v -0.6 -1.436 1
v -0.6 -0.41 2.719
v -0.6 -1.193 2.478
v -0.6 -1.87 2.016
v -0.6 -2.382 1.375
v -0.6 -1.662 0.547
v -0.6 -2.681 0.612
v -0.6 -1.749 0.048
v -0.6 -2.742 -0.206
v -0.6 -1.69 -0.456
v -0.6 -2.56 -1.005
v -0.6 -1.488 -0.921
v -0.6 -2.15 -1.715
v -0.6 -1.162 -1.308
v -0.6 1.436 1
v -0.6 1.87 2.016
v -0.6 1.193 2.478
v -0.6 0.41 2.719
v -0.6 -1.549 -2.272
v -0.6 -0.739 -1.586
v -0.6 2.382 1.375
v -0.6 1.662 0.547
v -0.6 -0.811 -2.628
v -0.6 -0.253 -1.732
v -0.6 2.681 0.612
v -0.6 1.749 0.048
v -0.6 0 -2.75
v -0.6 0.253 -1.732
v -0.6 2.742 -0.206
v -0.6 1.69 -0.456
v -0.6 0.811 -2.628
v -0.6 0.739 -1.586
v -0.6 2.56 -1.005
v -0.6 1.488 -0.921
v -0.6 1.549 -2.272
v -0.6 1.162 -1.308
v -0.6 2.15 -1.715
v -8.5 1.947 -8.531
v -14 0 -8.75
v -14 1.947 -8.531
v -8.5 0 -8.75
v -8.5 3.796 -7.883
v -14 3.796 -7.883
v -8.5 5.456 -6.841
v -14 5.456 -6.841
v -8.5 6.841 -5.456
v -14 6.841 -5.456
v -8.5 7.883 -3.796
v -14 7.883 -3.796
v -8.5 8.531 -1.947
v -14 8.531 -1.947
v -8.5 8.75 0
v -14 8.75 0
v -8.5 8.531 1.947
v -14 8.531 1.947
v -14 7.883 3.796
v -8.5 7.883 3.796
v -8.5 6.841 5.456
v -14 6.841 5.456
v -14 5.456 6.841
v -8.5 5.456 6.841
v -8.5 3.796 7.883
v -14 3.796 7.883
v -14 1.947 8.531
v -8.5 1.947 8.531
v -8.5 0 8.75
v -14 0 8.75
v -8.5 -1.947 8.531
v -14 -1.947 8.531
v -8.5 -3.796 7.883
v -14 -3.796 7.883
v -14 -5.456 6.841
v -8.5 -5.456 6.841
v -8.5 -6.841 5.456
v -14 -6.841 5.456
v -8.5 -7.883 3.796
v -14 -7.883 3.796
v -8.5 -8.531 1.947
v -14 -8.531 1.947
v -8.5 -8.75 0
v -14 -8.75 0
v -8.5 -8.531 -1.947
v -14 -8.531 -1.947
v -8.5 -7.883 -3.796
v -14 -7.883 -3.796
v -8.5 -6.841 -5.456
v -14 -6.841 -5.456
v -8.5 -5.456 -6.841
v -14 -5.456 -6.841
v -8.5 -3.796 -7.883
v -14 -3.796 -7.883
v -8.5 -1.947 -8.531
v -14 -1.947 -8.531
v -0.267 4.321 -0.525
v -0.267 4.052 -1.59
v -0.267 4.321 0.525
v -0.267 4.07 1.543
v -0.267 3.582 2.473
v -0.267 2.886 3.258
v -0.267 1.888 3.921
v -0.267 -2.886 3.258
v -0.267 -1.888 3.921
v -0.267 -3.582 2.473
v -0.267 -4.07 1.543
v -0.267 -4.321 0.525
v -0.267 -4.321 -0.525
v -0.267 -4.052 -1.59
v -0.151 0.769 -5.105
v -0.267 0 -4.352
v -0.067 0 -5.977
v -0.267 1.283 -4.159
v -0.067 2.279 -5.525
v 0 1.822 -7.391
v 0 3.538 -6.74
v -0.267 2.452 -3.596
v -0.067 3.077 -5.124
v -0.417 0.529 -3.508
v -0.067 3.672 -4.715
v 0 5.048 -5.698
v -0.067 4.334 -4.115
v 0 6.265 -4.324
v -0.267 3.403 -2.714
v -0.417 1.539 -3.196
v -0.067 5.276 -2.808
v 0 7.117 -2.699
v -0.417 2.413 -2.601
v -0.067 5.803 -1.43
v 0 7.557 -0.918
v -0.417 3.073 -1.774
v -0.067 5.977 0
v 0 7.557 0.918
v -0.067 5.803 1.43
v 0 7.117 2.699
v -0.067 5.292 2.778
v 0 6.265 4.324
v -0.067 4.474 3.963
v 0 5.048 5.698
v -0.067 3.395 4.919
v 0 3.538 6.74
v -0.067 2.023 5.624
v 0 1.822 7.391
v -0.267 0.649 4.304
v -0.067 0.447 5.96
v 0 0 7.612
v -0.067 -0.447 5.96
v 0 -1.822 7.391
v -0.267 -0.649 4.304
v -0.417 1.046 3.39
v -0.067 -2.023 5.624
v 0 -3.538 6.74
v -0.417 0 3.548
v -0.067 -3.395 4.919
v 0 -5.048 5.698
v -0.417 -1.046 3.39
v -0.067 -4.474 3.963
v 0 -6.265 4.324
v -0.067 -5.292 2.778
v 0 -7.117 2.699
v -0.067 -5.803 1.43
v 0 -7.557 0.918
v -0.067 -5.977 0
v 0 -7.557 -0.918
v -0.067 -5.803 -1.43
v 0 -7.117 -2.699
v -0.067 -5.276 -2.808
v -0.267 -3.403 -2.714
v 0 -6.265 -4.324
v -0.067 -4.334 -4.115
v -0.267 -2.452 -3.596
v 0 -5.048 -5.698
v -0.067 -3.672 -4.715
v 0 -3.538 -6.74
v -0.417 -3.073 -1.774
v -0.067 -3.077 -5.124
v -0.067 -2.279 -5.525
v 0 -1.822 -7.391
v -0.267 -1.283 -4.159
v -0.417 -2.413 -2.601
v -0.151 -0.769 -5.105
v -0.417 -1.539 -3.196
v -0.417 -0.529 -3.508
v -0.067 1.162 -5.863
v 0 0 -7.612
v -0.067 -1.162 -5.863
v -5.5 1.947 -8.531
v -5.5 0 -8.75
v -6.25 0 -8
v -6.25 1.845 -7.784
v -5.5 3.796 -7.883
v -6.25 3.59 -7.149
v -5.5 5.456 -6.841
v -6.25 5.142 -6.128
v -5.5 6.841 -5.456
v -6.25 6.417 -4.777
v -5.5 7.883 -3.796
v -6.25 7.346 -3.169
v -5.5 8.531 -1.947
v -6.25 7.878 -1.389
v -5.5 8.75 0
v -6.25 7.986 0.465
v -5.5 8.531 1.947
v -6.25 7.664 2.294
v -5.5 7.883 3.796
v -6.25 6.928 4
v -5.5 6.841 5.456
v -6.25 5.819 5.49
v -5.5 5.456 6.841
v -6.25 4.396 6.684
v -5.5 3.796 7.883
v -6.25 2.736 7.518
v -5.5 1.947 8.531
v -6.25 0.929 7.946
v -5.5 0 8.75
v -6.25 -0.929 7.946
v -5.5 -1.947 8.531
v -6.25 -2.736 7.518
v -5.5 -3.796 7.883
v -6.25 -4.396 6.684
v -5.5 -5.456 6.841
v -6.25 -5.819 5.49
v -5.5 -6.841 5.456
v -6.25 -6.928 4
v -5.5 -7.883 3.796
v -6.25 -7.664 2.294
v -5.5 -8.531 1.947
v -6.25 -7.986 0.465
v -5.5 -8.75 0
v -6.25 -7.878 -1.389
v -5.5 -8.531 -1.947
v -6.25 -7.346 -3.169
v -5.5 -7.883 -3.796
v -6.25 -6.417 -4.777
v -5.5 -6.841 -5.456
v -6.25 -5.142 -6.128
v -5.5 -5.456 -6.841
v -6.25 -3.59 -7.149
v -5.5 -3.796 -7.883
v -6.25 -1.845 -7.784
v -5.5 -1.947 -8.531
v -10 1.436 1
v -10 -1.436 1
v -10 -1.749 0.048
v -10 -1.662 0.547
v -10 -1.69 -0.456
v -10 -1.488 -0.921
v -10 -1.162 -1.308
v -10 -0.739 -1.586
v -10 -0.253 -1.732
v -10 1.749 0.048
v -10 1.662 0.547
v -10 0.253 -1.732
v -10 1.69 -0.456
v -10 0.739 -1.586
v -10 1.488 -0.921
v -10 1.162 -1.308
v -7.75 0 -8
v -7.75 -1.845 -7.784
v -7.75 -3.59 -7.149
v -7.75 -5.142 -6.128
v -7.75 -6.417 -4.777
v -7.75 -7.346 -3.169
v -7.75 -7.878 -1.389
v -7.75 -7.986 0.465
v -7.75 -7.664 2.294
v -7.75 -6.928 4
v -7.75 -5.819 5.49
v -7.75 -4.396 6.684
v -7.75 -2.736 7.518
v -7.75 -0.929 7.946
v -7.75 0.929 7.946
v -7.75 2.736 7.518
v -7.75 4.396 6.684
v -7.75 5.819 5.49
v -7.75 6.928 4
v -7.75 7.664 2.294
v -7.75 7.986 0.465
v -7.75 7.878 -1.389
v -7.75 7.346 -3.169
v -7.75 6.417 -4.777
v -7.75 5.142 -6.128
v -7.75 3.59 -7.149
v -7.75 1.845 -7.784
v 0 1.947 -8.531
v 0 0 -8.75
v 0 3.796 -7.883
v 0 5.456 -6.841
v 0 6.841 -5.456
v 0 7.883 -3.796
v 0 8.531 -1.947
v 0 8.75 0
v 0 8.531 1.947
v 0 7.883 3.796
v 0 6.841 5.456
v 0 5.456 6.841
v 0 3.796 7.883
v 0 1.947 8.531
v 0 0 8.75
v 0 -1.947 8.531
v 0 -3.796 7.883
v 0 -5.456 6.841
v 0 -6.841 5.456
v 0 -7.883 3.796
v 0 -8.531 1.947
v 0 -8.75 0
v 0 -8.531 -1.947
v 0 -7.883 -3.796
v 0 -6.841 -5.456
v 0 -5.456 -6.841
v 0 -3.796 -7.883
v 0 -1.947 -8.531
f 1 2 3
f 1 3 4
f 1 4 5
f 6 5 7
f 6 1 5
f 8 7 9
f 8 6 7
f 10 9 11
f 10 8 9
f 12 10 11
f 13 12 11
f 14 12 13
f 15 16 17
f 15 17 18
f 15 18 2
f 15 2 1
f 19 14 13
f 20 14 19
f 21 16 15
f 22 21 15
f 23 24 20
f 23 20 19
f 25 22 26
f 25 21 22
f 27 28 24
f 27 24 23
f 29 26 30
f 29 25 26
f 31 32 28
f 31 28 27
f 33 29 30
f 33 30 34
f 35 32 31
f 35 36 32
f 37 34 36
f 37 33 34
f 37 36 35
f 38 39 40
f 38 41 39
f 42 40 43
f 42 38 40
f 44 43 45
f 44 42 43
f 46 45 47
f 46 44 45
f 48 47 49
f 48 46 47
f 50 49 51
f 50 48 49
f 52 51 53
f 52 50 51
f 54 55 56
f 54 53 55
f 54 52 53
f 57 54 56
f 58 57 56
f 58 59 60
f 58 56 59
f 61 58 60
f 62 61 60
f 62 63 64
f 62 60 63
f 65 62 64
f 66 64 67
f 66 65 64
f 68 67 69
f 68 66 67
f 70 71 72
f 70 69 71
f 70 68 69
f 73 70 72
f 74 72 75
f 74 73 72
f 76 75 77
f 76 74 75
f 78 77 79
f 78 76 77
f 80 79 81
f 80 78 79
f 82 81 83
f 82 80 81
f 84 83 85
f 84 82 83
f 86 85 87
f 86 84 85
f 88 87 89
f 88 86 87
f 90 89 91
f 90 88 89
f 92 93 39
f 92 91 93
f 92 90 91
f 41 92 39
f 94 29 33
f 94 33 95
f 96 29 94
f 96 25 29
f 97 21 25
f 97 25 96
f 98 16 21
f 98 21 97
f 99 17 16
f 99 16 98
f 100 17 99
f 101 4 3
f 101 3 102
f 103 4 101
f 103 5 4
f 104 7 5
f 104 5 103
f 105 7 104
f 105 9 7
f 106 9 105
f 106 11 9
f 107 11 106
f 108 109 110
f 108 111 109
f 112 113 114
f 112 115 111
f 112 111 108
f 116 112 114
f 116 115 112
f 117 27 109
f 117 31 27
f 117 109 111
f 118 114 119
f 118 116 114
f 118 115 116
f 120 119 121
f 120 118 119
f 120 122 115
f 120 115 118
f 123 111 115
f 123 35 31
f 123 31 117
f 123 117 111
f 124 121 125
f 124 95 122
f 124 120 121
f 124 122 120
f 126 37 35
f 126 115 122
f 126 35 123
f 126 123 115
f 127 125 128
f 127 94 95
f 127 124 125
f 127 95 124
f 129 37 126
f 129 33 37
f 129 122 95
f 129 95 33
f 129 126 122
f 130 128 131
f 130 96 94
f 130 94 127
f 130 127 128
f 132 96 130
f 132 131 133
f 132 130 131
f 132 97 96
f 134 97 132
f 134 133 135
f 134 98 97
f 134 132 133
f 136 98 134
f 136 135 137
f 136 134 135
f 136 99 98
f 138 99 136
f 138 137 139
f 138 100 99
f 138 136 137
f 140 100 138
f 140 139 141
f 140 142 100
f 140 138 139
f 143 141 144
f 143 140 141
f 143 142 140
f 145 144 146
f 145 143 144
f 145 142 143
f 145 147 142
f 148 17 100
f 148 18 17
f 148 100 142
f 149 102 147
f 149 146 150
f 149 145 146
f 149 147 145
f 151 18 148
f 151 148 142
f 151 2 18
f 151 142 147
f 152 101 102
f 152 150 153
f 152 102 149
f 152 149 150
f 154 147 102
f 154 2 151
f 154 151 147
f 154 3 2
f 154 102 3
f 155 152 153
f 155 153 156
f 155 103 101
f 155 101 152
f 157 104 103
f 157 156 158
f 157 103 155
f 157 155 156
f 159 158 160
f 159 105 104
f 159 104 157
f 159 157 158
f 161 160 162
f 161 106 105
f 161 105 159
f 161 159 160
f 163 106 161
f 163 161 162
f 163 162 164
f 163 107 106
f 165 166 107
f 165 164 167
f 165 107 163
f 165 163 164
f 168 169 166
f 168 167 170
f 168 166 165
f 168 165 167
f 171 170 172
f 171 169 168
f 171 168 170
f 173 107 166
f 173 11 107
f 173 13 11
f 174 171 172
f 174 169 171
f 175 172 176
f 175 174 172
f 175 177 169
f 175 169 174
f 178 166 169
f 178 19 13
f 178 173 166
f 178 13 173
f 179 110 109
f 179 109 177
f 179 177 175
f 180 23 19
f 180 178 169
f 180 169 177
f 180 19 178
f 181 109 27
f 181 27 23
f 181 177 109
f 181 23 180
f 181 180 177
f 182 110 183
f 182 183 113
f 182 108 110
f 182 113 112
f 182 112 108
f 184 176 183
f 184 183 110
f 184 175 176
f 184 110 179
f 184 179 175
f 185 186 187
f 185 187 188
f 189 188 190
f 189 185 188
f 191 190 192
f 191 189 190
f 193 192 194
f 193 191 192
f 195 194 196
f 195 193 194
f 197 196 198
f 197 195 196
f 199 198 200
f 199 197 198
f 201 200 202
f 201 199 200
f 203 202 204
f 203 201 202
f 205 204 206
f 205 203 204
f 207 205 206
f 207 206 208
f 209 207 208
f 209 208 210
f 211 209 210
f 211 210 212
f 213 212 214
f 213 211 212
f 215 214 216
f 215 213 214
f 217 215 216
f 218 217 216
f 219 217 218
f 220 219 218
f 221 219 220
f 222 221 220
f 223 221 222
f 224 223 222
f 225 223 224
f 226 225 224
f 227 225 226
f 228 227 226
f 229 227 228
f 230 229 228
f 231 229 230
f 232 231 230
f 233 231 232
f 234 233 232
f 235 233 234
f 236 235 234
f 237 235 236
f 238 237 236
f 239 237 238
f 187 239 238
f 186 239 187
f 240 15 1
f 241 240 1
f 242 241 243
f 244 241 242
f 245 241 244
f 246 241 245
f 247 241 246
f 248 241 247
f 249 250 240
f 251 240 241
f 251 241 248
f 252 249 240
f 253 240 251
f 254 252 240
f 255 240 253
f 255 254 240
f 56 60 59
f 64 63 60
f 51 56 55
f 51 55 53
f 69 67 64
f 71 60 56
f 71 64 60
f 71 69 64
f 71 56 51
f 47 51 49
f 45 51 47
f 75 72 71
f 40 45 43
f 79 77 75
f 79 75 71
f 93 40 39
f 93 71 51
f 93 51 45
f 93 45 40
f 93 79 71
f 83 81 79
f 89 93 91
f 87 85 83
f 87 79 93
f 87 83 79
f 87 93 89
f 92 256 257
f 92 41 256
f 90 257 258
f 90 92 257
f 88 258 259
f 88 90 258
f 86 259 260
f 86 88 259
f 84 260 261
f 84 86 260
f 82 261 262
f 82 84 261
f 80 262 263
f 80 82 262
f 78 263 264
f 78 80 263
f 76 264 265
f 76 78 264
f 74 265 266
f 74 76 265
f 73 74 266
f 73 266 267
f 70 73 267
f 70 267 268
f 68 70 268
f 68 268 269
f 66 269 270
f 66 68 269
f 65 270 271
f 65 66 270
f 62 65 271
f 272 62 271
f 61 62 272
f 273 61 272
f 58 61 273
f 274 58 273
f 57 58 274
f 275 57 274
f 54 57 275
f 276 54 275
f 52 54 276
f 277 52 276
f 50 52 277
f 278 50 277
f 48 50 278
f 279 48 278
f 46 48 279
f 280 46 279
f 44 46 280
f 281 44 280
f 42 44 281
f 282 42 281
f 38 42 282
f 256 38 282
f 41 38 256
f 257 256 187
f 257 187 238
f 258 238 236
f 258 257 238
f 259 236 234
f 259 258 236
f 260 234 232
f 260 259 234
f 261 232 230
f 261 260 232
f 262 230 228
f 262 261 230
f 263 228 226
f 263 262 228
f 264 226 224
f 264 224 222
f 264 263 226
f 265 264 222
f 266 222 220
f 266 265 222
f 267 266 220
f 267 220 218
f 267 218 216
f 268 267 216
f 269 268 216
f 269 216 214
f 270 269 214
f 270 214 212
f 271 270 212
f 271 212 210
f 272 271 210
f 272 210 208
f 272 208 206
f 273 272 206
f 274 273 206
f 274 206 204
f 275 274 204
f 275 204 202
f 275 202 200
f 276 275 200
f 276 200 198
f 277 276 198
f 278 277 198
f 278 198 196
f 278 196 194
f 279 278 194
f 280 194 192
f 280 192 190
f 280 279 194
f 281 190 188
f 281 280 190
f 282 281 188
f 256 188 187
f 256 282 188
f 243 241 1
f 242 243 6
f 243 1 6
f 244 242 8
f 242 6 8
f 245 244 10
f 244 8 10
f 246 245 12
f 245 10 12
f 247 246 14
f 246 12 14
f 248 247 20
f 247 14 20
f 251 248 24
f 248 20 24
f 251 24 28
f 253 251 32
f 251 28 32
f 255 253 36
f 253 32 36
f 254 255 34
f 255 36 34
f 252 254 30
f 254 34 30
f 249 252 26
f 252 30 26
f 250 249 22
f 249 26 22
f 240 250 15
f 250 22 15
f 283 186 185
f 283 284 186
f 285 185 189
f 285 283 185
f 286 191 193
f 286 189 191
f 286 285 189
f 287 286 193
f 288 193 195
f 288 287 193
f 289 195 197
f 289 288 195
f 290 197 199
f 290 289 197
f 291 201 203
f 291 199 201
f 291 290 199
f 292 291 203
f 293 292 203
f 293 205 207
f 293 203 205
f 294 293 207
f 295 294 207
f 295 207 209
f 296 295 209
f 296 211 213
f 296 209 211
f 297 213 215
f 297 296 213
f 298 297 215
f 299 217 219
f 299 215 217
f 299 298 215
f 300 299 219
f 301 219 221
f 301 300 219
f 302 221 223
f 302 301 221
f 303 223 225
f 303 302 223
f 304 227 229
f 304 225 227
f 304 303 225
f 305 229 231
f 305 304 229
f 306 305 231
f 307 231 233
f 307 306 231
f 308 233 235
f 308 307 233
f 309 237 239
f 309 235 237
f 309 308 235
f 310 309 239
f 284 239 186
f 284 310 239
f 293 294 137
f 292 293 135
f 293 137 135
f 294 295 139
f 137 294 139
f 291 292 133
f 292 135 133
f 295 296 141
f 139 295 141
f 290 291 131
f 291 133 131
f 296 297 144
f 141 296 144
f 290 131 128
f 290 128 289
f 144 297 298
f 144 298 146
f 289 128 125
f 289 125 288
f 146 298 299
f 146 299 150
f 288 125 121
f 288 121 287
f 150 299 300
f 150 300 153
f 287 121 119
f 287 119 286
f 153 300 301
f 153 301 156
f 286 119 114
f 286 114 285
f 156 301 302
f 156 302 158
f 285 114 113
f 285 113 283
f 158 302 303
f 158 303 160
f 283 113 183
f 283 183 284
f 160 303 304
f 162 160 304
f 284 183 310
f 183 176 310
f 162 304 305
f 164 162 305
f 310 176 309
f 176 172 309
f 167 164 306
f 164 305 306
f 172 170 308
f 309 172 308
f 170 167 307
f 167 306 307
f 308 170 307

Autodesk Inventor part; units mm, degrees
ref_plane "YZ Plane" through (0, 0, 0) normal (1, 0, 0) x (0, 1, 0)
ref_plane "XZ Plane" through (0, 0, 0) normal (0, 1, 0) x (-1, 0, 0)
ref_plane "XY Plane" through (0, 0, 0) normal (0, 0, 1) x (1, 0, 0)
sketch "Sketch1" plane through (0, 0, 0) normal (0, 1, 0) x (-1, 0, 0)
  line L0 (0, 0) -> (14, 0)
  line L1 (14, 0) -> (14, -8.75)
  line L2 (14, -8.75) -> (0, -8.75)
  line L3 (0, -8.75) -> (0, 0)
  line L4 (14, 0) -> (0, 0)
  line L5 (0, 0) -> (0, -8)
  line L6 (0, -8) -> (14, -8)
  line L7 (14, -8) -> (14, 0)
  line L8 (0, -8.75) -> (5.5, -8.75)
  line L9 (14, -8.75) -> (8.5, -8.75)
  line L10 (8.5, -8.75) -> (8.5, -4)
  line L11 (5.5, -8.75) -> (5.5, -4)
  line L12 (5.5, -8) -> (7, -8)
  line L13 (5.5, -8) -> (6.25, -8)
  line L14 (8.5, -8) -> (7, -8)
  line L15 (8.5, -8) -> (7.75, -8)
  line L16 (7.75, -8) -> (8.5, -8.75)
  line L17 (6.25, -8) -> (5.5, -8.75)
  dimension "d0" = 14
  dimension "d1" = 8.75
  dimension "d2" = 8
  dimension "d3" = 5.5
  dimension "d4" = 5.5
revolve "Revolution1" add sketch "Sketch1" angle 360 about axis through (0, 0, 0) along (-1, 0, 0) contours L0 L1 L6 L3 | L6 L11 L2 L3 | L1 L2 L10 L6 | L6 L17 L11 | L10 L16 L6
sketch "Sketch2" plane through (0, 0, 0) normal (1, 0, 0) x (0, 0, -1)
  circle A0 centre (0, 0) radius 1.5
  line L0 (-1.5, 0) -> (-1, 0)
  line L1 (-1, 0) -> (-1, 1.118)
  line L2 (-1, 0) -> (-1, -1.118)
  circle A1 centre (0, 0) radius 2.75
  dimension "d6" = 3
  dimension "d7" = 0.5
  dimension "d8" = 5.5
extrude "Extrusion1" cut sketch "Sketch2" against normal blind 10 contours A0 L2 L1
extrude "Extrusion2" cut sketch "Sketch2" against normal blind 0.6 contours L1 L0 A0 | A0 L0 L2 | A1
fillet "Fillet1" radius 20 1 edges at (0, 0, 2.75)
sketch "Sketch3" plane through (-14, 0, 0) normal (-1, 0, 0) x (0, 0, 1)
  circle A0 centre (0, 0) radius 8.75 projected
  line L0 (0, -8.75) -> (0, -6.75)
  line L1 (0, 8.75) -> (0, 6.75)
  circle A1 centre (0, 0) radius 6.75
  dimension "d14" = 2
  dimension "d15" = 2
extrude "Extrusion3" cut sketch "Sketch3" against normal blind 1 contours A1
fillet "Fillet2" radius 0.5 1 edges at (-14, 0, -6.75)
sketch "Sketch4" plane through (-0.6, 0, 0) normal (1, 0, 0) x (0, 0, -1)
  circle A0 centre (0, 0) radius 2.75 projected
  line L0 (-1, 1.118) -> (-1, -1.118) projected
  arc A1 (-1, -1.118) -> (-1, 1.118) centre (0, 0) ccw projected
  line L1 (1.5, 0) -> (1.6492, 0)
  line L2 (1.5, 0) -> (1.75, 0)
  circle A2 centre (0, 0) radius 1.75
  line L3 (-1, 1.118) -> (-1, -1.118) projected
  line L4 (-1, 0) -> (-1.25, 0)
  line L5 (-1.25, 0) -> (-1.25, 1.2247)
  line L6 (-1.25, 0) -> (-1.25, -1.2247)
  dimension "d19" = 0.25
  dimension "d20" = 0.25
extrude "Extrusion4" cut sketch "Sketch4" against normal blind 9.4 contours L0 L4 L5 A2 L2 L1 A1 | L0 A1 L1 L2 A2 L6 L4
sketch "Sketch5" plane through (-14, 0, 0) normal (-1, 0, 0) x (0, 0, 1)
  circle A0 centre (0, 0) radius 8.75 projected
  circle A1 centre (0, 0) radius 7.25 projected
  circle A2 centre (0, 0) radius 8.75
extrude "Extrusion5" add sketch "Sketch5" against normal blind 1 contours A0 | A1
sketch "Sketch6" plane through (-0.6, 0, 0) normal (1, 0, 0) x (0, 0, -1)
  arc A0 (-1.25, -1.2247) -> (-1.25, 1.2247) centre (0, 0) ccw projected
  line L0 (-1.25, -1.2247) -> (-1.25, 1.2247) projected
  circle A1 centre (0, 0) radius 2.75 projected
  circle A2 centre (0, 0) radius 1.75
  line L1 (-1.25, -1.2247) -> (-1.25, 1.2247) projected
  line L2 (-1.25, 0) -> (-1, 0)
  line L3 (-1, 0) -> (-1, -1.4361)
  arc A3 (-1.25, -1.2247) -> (-1.25, 1.2247) centre (0, 0) ccw projected
  line L4 (-1, 0) -> (-1, 1.4361)
  dimension "d25" = 0.25
extrude "Extrusion6" add sketch "Sketch6" against normal blind 10 contours L0 L2 L3 A0 | L0 A0 L4 L2
properties part number "koło"
